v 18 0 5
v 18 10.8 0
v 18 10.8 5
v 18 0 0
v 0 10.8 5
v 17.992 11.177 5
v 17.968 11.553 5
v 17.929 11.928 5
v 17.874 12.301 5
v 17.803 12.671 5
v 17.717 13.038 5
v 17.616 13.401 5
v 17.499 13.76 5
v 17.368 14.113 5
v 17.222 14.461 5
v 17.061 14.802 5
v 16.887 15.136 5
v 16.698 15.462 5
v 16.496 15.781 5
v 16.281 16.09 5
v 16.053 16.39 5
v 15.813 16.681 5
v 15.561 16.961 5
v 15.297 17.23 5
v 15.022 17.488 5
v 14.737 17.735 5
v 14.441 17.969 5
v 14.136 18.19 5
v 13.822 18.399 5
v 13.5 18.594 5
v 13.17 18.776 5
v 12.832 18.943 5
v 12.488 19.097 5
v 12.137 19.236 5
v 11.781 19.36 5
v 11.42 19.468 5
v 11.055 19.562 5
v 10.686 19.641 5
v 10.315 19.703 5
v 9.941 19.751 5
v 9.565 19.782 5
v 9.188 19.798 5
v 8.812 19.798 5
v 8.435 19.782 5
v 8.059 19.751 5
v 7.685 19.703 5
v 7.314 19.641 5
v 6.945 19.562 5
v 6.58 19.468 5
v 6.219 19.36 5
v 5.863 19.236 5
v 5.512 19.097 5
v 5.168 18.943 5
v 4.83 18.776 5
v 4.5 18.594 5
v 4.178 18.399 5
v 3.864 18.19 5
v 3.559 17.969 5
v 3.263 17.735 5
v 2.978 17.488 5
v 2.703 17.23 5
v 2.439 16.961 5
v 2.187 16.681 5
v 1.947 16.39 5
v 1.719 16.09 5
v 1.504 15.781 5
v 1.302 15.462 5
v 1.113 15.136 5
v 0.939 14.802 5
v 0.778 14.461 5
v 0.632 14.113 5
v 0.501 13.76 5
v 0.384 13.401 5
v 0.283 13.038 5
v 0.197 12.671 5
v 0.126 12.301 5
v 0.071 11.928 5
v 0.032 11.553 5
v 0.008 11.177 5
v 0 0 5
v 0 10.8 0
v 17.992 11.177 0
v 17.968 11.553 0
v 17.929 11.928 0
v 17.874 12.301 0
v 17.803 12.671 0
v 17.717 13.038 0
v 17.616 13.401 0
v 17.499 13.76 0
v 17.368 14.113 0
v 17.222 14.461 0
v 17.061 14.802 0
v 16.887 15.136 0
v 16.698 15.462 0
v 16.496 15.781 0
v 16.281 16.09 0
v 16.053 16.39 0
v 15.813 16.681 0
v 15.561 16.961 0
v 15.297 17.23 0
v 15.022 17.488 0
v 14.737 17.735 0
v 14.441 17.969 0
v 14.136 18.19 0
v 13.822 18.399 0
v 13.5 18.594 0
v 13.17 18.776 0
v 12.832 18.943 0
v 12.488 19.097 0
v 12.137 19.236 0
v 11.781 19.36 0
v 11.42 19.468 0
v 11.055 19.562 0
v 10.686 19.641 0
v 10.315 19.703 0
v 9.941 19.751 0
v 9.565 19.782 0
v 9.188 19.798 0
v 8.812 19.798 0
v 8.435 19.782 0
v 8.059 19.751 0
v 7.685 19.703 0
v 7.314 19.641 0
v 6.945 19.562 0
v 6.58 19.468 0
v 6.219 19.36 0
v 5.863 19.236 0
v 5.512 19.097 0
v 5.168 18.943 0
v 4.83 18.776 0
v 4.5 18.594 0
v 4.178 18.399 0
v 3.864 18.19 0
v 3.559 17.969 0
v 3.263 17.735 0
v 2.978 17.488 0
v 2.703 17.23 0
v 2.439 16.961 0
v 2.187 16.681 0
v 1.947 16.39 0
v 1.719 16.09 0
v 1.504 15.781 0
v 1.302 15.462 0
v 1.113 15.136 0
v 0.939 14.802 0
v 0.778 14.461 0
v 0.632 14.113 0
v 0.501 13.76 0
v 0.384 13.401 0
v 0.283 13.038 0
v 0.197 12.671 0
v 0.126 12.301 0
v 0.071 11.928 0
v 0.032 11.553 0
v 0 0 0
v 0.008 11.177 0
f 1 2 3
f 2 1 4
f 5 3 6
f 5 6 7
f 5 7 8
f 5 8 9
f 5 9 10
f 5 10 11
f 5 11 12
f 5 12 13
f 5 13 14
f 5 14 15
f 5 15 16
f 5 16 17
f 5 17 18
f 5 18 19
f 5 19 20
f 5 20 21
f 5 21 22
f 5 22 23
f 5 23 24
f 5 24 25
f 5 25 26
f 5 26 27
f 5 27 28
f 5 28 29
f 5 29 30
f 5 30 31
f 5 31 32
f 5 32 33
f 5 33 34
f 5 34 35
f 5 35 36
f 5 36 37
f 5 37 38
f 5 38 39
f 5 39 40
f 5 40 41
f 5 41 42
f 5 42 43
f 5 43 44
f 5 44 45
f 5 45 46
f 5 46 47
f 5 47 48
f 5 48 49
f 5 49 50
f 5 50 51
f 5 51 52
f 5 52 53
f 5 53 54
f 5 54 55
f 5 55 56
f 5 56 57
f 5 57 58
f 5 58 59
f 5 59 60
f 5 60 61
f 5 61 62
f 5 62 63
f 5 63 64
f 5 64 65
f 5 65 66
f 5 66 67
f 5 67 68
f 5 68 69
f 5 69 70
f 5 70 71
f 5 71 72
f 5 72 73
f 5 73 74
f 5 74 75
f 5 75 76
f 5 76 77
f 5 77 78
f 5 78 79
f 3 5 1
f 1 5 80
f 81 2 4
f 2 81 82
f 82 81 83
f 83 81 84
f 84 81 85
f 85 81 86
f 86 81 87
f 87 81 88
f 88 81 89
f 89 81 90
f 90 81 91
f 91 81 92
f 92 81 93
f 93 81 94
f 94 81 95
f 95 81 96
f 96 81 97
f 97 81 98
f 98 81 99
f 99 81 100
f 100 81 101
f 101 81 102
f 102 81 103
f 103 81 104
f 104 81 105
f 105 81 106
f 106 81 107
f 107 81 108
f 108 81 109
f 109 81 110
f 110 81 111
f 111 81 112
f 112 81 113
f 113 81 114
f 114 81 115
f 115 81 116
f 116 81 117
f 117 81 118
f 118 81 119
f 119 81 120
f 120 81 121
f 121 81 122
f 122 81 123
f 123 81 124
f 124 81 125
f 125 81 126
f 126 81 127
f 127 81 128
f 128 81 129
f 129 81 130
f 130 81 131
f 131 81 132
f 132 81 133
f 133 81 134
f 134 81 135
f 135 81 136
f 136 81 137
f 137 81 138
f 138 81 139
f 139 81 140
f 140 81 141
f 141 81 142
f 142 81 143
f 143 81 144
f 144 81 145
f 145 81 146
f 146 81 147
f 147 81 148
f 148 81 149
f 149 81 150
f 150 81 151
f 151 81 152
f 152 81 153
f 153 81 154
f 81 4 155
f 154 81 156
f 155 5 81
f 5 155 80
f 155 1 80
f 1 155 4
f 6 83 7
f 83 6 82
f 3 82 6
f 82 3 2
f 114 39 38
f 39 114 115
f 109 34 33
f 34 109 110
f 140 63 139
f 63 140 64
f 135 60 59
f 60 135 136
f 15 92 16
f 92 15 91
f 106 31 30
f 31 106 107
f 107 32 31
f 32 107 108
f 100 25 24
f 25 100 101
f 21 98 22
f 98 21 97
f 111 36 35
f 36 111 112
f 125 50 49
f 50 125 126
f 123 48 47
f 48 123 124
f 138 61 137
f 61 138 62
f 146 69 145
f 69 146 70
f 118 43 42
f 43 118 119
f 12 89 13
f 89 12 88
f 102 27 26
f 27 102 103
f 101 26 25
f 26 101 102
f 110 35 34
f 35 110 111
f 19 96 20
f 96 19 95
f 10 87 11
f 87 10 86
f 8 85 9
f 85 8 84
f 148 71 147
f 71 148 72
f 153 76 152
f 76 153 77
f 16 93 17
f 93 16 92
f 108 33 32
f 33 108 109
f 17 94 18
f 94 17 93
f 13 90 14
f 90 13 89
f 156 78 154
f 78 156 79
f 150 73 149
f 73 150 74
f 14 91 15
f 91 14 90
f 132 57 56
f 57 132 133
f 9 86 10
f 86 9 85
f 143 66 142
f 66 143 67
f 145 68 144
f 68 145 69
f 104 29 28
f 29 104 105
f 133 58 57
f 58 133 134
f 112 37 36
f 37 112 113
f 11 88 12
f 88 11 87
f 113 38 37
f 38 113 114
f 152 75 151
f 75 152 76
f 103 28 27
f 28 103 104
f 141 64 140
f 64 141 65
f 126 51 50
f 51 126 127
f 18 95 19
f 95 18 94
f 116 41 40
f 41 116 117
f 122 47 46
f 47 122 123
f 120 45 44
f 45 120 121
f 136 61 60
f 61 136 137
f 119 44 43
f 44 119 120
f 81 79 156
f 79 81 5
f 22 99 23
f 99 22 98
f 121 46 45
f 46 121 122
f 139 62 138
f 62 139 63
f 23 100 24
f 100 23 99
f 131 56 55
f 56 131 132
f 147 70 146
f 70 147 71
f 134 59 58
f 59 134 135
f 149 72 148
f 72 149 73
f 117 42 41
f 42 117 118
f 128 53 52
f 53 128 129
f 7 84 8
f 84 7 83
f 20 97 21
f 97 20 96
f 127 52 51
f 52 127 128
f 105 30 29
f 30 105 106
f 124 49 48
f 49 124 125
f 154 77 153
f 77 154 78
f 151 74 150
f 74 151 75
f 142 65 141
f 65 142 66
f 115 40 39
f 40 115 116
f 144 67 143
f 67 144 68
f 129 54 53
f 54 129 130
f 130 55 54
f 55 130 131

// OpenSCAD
$fn = 150;

union() {
	cube(size = [18.0, 10.799999999999999, 5]);
	translate(v = [0, 10.799999999999999, 0]) {
		translate(v = [9.0, 0, 0]) {
			cylinder(d = 18.0, h = 5);
		}
	}
}
